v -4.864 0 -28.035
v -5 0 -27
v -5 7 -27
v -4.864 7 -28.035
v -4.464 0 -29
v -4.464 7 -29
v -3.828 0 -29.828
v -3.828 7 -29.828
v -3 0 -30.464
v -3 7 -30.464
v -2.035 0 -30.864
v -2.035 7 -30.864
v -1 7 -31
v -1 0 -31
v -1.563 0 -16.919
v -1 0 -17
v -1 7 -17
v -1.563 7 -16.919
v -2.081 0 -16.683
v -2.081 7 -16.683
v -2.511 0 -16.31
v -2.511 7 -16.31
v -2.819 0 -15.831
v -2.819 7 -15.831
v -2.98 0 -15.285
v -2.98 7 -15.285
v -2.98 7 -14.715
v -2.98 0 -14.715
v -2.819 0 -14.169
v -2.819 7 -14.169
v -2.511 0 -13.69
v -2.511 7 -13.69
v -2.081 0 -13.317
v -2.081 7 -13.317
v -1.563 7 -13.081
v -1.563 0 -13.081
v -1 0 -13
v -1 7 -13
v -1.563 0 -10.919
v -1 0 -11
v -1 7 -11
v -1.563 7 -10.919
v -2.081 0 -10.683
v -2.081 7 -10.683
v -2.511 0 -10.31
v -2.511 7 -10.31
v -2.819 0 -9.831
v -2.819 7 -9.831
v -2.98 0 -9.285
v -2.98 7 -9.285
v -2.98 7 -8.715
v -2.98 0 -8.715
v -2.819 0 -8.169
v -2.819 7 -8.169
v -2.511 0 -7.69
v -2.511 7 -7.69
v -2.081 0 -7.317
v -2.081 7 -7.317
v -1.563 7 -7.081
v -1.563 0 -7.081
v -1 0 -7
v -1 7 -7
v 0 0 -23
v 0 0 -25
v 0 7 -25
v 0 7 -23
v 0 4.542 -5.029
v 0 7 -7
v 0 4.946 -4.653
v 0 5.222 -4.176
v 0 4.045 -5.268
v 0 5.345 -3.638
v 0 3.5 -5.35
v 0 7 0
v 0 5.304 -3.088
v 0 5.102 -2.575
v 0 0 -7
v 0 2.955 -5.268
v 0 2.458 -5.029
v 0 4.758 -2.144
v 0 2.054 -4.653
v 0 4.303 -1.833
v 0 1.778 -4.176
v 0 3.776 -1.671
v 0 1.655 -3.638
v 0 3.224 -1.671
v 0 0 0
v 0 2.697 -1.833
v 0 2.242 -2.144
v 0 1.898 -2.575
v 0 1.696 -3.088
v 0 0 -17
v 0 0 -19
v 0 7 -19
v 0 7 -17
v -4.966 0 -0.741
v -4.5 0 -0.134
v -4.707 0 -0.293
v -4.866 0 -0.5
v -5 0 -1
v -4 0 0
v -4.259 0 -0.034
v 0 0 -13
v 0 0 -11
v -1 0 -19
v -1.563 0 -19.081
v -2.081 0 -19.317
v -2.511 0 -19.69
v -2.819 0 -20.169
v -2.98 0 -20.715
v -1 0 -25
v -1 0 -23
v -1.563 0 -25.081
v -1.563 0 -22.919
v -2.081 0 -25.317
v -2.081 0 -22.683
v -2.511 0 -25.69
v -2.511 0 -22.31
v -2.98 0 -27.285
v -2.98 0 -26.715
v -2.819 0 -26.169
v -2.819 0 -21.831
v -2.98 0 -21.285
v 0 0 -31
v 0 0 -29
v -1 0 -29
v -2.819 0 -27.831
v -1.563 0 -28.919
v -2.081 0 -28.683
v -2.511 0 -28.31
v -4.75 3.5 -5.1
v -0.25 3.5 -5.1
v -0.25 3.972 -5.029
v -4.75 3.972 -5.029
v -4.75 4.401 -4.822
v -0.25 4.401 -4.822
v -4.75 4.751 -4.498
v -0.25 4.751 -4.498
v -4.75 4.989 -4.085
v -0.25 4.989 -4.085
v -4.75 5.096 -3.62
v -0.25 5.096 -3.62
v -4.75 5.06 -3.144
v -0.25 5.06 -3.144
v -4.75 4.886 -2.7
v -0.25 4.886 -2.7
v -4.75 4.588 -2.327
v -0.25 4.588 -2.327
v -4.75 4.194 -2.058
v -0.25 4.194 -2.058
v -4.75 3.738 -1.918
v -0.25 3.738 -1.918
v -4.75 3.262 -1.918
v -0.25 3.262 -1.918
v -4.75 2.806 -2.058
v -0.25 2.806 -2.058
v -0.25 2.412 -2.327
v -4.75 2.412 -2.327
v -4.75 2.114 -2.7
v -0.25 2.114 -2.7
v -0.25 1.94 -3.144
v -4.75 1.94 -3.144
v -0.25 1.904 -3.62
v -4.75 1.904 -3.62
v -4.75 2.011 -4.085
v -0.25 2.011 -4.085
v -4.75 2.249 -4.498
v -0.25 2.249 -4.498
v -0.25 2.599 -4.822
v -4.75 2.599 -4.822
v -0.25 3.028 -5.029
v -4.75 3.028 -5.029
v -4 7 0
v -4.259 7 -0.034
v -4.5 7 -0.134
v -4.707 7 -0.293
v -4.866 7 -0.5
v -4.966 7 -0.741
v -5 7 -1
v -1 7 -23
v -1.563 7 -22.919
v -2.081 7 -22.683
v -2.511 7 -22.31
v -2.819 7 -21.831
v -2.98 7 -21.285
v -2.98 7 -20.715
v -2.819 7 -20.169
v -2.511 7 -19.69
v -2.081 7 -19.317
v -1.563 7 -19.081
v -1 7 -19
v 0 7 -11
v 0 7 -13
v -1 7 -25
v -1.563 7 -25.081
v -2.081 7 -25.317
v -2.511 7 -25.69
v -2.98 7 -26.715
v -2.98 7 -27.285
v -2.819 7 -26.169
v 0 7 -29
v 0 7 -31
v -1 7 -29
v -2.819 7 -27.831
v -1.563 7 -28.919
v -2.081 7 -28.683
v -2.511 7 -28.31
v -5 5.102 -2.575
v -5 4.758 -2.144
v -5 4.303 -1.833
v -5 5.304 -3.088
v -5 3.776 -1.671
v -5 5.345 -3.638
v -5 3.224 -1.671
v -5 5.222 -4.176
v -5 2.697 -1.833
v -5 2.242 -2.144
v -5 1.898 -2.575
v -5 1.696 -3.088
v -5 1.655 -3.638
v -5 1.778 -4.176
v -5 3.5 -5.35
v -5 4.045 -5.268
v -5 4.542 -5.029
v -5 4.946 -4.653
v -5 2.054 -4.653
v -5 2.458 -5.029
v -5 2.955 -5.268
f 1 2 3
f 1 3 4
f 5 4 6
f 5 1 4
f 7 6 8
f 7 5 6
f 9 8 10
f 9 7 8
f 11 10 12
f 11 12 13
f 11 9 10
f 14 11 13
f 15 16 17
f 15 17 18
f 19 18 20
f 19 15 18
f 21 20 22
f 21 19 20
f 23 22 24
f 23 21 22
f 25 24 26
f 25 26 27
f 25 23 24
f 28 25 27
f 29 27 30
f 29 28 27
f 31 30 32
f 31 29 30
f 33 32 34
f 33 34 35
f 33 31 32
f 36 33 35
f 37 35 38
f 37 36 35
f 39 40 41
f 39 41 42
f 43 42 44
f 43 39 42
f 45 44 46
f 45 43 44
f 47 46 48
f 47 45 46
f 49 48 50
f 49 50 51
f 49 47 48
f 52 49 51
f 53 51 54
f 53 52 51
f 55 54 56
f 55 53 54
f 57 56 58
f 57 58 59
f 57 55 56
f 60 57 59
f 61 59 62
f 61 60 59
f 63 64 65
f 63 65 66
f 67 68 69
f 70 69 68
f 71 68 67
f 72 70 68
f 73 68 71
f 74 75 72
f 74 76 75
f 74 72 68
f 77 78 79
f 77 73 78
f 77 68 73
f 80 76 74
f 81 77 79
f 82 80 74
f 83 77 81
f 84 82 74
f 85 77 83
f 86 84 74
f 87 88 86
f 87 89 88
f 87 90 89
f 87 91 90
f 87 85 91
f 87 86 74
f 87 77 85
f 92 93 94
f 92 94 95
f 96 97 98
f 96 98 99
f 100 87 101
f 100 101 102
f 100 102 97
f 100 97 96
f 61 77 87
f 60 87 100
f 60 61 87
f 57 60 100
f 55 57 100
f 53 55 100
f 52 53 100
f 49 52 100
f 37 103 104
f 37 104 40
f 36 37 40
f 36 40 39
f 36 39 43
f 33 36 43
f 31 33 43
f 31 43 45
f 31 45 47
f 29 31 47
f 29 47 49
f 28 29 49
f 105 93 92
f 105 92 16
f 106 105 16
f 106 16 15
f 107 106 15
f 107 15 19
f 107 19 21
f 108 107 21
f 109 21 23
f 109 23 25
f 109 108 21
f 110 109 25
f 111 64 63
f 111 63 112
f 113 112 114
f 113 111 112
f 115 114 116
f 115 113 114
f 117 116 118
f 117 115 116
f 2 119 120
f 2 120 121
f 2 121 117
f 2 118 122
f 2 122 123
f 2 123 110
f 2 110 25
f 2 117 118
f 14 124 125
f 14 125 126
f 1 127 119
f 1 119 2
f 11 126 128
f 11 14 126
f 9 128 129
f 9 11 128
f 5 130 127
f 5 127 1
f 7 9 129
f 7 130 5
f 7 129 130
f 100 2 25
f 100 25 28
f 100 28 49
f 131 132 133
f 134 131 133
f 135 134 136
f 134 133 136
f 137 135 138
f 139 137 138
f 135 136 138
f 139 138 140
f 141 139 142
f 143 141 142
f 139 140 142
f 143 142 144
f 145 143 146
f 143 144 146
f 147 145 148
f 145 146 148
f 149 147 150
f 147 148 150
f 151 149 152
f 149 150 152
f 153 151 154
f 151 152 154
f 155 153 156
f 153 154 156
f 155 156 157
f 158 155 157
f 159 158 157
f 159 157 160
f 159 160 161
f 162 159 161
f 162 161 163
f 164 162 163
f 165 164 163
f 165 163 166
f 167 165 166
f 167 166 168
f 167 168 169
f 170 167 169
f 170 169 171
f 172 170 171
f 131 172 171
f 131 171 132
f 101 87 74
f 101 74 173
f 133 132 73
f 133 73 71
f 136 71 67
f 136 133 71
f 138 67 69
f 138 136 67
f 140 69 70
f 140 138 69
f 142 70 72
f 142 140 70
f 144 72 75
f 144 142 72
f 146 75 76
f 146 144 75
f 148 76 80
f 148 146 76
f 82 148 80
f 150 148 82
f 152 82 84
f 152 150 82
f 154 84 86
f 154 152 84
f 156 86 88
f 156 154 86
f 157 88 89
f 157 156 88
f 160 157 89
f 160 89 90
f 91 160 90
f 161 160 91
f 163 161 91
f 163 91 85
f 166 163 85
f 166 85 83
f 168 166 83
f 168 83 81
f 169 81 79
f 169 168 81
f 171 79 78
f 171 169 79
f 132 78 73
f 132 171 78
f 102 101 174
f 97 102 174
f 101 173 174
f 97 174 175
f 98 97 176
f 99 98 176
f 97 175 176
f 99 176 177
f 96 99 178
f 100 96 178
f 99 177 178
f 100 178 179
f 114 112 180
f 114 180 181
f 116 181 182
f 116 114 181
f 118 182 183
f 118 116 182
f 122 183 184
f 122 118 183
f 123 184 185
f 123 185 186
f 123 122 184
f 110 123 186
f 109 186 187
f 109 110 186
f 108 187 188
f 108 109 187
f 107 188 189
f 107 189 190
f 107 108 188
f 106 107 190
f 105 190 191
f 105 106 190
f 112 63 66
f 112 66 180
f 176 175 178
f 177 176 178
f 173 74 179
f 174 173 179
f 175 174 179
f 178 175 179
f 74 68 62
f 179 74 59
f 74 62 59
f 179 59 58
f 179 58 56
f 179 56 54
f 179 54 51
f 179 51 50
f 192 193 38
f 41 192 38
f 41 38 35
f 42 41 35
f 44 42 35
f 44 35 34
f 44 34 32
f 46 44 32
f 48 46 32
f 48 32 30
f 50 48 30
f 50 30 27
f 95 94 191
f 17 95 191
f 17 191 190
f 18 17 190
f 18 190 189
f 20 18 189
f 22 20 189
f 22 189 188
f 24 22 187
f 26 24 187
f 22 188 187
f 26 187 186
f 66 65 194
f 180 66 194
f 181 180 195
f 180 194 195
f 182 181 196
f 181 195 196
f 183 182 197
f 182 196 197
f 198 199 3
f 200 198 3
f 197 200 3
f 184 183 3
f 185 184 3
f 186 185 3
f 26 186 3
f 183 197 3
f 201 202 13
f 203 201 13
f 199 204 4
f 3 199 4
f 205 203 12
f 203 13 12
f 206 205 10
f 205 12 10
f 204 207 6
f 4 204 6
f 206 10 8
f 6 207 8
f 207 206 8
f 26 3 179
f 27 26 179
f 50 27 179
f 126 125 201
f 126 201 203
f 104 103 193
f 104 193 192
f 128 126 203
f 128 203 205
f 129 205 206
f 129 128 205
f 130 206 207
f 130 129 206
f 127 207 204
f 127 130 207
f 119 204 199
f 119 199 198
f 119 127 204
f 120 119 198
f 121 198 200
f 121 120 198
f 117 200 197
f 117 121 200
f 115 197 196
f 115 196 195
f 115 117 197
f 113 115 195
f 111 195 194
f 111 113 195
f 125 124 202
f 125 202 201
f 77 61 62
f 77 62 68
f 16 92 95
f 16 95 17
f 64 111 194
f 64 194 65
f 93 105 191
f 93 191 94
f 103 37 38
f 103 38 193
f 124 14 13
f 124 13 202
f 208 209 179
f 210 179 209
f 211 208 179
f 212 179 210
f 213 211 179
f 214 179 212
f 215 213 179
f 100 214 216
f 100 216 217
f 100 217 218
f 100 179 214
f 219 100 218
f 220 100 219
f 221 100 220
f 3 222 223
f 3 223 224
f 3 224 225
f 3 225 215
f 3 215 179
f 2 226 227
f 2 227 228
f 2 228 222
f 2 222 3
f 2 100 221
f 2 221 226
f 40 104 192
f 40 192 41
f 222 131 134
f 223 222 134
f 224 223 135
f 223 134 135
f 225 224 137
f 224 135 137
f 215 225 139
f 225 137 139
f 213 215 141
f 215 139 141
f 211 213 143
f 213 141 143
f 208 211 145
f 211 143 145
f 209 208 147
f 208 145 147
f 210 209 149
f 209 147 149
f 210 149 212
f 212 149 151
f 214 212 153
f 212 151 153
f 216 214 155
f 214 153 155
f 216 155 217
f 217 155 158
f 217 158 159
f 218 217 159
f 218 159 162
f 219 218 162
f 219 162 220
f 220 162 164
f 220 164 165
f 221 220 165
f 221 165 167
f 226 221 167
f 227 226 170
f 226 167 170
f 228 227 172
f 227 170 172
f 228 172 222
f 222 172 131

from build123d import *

# Parameters (mm, degrees)
BOSS_EXTRUDE1_DEPTH  = 7
M3_CLEARANCE_HOLE1_D = 3.2
CHAMFER2_SIZE        = 0.25
FILLET1_R            = 1


with BuildPart() as part:
    # Sketch1 → Boss-Extrude1 (new body)
    with BuildSketch(Plane(origin=(0, 0, 0), x_dir=(1, 0, 0), z_dir=(0, 1, 0))):
        with BuildLine():
            Line((0, 0), (-5, 0))
            Line((-5, 0), (-5, 9.065528002))
            Line((-5, 9.065528002), (-5, 27))
            ThreePointArc((-5, 27), (-3.828427125, 29.828427125), (-1, 31))
            Line((-1, 31), (0, 31))
            Line((0, 31), (0, 29))
            Line((0, 29), (-1, 29))
            ThreePointArc((-1, 29), (-3, 27), (-1, 25))
            Line((-1, 25), (0, 25))
            Line((0, 25), (0, 23))
            Line((0, 23), (-1, 23))
            ThreePointArc((-1, 23), (-3, 21), (-1, 19))
            Line((-1, 19), (0, 19))
            Line((0, 19), (0, 17))
            Line((0, 17), (-1, 17))
            ThreePointArc((-1, 17), (-3, 15), (-1, 13))
            Line((-1, 13), (0, 13))
            Line((0, 13), (0, 11))
            Line((0, 11), (-1, 11))
            ThreePointArc((-1, 11), (-3, 9), (-1, 7))
            Line((-1, 7), (0, 7))
            Line((0, 7), (0, 0))
        make_face()
    extrude(amount=BOSS_EXTRUDE1_DEPTH)

    # M3 Clearance Hole1 (through all)
    with Locations(Plane.ZY.offset(5)):
        with Locations((-3.5, 3.5)):
            Hole(M3_CLEARANCE_HOLE1_D / 2)

    # Chamfer2
    chamfer2_edges = [part.edges().sort_by_distance(p)[0] for p in [
        (-5, 3.5, -1.9),
        (0, 3.5, -1.9),
    ]]
    chamfer(chamfer2_edges, length=CHAMFER2_SIZE)

    # Fillet1
    fillet1_edges = [part.edges().sort_by_distance(p)[0] for p in [
        (-5, 3.5, 0),
    ]]
    fillet(fillet1_edges, radius=FILLET1_R)


solid = part.part
